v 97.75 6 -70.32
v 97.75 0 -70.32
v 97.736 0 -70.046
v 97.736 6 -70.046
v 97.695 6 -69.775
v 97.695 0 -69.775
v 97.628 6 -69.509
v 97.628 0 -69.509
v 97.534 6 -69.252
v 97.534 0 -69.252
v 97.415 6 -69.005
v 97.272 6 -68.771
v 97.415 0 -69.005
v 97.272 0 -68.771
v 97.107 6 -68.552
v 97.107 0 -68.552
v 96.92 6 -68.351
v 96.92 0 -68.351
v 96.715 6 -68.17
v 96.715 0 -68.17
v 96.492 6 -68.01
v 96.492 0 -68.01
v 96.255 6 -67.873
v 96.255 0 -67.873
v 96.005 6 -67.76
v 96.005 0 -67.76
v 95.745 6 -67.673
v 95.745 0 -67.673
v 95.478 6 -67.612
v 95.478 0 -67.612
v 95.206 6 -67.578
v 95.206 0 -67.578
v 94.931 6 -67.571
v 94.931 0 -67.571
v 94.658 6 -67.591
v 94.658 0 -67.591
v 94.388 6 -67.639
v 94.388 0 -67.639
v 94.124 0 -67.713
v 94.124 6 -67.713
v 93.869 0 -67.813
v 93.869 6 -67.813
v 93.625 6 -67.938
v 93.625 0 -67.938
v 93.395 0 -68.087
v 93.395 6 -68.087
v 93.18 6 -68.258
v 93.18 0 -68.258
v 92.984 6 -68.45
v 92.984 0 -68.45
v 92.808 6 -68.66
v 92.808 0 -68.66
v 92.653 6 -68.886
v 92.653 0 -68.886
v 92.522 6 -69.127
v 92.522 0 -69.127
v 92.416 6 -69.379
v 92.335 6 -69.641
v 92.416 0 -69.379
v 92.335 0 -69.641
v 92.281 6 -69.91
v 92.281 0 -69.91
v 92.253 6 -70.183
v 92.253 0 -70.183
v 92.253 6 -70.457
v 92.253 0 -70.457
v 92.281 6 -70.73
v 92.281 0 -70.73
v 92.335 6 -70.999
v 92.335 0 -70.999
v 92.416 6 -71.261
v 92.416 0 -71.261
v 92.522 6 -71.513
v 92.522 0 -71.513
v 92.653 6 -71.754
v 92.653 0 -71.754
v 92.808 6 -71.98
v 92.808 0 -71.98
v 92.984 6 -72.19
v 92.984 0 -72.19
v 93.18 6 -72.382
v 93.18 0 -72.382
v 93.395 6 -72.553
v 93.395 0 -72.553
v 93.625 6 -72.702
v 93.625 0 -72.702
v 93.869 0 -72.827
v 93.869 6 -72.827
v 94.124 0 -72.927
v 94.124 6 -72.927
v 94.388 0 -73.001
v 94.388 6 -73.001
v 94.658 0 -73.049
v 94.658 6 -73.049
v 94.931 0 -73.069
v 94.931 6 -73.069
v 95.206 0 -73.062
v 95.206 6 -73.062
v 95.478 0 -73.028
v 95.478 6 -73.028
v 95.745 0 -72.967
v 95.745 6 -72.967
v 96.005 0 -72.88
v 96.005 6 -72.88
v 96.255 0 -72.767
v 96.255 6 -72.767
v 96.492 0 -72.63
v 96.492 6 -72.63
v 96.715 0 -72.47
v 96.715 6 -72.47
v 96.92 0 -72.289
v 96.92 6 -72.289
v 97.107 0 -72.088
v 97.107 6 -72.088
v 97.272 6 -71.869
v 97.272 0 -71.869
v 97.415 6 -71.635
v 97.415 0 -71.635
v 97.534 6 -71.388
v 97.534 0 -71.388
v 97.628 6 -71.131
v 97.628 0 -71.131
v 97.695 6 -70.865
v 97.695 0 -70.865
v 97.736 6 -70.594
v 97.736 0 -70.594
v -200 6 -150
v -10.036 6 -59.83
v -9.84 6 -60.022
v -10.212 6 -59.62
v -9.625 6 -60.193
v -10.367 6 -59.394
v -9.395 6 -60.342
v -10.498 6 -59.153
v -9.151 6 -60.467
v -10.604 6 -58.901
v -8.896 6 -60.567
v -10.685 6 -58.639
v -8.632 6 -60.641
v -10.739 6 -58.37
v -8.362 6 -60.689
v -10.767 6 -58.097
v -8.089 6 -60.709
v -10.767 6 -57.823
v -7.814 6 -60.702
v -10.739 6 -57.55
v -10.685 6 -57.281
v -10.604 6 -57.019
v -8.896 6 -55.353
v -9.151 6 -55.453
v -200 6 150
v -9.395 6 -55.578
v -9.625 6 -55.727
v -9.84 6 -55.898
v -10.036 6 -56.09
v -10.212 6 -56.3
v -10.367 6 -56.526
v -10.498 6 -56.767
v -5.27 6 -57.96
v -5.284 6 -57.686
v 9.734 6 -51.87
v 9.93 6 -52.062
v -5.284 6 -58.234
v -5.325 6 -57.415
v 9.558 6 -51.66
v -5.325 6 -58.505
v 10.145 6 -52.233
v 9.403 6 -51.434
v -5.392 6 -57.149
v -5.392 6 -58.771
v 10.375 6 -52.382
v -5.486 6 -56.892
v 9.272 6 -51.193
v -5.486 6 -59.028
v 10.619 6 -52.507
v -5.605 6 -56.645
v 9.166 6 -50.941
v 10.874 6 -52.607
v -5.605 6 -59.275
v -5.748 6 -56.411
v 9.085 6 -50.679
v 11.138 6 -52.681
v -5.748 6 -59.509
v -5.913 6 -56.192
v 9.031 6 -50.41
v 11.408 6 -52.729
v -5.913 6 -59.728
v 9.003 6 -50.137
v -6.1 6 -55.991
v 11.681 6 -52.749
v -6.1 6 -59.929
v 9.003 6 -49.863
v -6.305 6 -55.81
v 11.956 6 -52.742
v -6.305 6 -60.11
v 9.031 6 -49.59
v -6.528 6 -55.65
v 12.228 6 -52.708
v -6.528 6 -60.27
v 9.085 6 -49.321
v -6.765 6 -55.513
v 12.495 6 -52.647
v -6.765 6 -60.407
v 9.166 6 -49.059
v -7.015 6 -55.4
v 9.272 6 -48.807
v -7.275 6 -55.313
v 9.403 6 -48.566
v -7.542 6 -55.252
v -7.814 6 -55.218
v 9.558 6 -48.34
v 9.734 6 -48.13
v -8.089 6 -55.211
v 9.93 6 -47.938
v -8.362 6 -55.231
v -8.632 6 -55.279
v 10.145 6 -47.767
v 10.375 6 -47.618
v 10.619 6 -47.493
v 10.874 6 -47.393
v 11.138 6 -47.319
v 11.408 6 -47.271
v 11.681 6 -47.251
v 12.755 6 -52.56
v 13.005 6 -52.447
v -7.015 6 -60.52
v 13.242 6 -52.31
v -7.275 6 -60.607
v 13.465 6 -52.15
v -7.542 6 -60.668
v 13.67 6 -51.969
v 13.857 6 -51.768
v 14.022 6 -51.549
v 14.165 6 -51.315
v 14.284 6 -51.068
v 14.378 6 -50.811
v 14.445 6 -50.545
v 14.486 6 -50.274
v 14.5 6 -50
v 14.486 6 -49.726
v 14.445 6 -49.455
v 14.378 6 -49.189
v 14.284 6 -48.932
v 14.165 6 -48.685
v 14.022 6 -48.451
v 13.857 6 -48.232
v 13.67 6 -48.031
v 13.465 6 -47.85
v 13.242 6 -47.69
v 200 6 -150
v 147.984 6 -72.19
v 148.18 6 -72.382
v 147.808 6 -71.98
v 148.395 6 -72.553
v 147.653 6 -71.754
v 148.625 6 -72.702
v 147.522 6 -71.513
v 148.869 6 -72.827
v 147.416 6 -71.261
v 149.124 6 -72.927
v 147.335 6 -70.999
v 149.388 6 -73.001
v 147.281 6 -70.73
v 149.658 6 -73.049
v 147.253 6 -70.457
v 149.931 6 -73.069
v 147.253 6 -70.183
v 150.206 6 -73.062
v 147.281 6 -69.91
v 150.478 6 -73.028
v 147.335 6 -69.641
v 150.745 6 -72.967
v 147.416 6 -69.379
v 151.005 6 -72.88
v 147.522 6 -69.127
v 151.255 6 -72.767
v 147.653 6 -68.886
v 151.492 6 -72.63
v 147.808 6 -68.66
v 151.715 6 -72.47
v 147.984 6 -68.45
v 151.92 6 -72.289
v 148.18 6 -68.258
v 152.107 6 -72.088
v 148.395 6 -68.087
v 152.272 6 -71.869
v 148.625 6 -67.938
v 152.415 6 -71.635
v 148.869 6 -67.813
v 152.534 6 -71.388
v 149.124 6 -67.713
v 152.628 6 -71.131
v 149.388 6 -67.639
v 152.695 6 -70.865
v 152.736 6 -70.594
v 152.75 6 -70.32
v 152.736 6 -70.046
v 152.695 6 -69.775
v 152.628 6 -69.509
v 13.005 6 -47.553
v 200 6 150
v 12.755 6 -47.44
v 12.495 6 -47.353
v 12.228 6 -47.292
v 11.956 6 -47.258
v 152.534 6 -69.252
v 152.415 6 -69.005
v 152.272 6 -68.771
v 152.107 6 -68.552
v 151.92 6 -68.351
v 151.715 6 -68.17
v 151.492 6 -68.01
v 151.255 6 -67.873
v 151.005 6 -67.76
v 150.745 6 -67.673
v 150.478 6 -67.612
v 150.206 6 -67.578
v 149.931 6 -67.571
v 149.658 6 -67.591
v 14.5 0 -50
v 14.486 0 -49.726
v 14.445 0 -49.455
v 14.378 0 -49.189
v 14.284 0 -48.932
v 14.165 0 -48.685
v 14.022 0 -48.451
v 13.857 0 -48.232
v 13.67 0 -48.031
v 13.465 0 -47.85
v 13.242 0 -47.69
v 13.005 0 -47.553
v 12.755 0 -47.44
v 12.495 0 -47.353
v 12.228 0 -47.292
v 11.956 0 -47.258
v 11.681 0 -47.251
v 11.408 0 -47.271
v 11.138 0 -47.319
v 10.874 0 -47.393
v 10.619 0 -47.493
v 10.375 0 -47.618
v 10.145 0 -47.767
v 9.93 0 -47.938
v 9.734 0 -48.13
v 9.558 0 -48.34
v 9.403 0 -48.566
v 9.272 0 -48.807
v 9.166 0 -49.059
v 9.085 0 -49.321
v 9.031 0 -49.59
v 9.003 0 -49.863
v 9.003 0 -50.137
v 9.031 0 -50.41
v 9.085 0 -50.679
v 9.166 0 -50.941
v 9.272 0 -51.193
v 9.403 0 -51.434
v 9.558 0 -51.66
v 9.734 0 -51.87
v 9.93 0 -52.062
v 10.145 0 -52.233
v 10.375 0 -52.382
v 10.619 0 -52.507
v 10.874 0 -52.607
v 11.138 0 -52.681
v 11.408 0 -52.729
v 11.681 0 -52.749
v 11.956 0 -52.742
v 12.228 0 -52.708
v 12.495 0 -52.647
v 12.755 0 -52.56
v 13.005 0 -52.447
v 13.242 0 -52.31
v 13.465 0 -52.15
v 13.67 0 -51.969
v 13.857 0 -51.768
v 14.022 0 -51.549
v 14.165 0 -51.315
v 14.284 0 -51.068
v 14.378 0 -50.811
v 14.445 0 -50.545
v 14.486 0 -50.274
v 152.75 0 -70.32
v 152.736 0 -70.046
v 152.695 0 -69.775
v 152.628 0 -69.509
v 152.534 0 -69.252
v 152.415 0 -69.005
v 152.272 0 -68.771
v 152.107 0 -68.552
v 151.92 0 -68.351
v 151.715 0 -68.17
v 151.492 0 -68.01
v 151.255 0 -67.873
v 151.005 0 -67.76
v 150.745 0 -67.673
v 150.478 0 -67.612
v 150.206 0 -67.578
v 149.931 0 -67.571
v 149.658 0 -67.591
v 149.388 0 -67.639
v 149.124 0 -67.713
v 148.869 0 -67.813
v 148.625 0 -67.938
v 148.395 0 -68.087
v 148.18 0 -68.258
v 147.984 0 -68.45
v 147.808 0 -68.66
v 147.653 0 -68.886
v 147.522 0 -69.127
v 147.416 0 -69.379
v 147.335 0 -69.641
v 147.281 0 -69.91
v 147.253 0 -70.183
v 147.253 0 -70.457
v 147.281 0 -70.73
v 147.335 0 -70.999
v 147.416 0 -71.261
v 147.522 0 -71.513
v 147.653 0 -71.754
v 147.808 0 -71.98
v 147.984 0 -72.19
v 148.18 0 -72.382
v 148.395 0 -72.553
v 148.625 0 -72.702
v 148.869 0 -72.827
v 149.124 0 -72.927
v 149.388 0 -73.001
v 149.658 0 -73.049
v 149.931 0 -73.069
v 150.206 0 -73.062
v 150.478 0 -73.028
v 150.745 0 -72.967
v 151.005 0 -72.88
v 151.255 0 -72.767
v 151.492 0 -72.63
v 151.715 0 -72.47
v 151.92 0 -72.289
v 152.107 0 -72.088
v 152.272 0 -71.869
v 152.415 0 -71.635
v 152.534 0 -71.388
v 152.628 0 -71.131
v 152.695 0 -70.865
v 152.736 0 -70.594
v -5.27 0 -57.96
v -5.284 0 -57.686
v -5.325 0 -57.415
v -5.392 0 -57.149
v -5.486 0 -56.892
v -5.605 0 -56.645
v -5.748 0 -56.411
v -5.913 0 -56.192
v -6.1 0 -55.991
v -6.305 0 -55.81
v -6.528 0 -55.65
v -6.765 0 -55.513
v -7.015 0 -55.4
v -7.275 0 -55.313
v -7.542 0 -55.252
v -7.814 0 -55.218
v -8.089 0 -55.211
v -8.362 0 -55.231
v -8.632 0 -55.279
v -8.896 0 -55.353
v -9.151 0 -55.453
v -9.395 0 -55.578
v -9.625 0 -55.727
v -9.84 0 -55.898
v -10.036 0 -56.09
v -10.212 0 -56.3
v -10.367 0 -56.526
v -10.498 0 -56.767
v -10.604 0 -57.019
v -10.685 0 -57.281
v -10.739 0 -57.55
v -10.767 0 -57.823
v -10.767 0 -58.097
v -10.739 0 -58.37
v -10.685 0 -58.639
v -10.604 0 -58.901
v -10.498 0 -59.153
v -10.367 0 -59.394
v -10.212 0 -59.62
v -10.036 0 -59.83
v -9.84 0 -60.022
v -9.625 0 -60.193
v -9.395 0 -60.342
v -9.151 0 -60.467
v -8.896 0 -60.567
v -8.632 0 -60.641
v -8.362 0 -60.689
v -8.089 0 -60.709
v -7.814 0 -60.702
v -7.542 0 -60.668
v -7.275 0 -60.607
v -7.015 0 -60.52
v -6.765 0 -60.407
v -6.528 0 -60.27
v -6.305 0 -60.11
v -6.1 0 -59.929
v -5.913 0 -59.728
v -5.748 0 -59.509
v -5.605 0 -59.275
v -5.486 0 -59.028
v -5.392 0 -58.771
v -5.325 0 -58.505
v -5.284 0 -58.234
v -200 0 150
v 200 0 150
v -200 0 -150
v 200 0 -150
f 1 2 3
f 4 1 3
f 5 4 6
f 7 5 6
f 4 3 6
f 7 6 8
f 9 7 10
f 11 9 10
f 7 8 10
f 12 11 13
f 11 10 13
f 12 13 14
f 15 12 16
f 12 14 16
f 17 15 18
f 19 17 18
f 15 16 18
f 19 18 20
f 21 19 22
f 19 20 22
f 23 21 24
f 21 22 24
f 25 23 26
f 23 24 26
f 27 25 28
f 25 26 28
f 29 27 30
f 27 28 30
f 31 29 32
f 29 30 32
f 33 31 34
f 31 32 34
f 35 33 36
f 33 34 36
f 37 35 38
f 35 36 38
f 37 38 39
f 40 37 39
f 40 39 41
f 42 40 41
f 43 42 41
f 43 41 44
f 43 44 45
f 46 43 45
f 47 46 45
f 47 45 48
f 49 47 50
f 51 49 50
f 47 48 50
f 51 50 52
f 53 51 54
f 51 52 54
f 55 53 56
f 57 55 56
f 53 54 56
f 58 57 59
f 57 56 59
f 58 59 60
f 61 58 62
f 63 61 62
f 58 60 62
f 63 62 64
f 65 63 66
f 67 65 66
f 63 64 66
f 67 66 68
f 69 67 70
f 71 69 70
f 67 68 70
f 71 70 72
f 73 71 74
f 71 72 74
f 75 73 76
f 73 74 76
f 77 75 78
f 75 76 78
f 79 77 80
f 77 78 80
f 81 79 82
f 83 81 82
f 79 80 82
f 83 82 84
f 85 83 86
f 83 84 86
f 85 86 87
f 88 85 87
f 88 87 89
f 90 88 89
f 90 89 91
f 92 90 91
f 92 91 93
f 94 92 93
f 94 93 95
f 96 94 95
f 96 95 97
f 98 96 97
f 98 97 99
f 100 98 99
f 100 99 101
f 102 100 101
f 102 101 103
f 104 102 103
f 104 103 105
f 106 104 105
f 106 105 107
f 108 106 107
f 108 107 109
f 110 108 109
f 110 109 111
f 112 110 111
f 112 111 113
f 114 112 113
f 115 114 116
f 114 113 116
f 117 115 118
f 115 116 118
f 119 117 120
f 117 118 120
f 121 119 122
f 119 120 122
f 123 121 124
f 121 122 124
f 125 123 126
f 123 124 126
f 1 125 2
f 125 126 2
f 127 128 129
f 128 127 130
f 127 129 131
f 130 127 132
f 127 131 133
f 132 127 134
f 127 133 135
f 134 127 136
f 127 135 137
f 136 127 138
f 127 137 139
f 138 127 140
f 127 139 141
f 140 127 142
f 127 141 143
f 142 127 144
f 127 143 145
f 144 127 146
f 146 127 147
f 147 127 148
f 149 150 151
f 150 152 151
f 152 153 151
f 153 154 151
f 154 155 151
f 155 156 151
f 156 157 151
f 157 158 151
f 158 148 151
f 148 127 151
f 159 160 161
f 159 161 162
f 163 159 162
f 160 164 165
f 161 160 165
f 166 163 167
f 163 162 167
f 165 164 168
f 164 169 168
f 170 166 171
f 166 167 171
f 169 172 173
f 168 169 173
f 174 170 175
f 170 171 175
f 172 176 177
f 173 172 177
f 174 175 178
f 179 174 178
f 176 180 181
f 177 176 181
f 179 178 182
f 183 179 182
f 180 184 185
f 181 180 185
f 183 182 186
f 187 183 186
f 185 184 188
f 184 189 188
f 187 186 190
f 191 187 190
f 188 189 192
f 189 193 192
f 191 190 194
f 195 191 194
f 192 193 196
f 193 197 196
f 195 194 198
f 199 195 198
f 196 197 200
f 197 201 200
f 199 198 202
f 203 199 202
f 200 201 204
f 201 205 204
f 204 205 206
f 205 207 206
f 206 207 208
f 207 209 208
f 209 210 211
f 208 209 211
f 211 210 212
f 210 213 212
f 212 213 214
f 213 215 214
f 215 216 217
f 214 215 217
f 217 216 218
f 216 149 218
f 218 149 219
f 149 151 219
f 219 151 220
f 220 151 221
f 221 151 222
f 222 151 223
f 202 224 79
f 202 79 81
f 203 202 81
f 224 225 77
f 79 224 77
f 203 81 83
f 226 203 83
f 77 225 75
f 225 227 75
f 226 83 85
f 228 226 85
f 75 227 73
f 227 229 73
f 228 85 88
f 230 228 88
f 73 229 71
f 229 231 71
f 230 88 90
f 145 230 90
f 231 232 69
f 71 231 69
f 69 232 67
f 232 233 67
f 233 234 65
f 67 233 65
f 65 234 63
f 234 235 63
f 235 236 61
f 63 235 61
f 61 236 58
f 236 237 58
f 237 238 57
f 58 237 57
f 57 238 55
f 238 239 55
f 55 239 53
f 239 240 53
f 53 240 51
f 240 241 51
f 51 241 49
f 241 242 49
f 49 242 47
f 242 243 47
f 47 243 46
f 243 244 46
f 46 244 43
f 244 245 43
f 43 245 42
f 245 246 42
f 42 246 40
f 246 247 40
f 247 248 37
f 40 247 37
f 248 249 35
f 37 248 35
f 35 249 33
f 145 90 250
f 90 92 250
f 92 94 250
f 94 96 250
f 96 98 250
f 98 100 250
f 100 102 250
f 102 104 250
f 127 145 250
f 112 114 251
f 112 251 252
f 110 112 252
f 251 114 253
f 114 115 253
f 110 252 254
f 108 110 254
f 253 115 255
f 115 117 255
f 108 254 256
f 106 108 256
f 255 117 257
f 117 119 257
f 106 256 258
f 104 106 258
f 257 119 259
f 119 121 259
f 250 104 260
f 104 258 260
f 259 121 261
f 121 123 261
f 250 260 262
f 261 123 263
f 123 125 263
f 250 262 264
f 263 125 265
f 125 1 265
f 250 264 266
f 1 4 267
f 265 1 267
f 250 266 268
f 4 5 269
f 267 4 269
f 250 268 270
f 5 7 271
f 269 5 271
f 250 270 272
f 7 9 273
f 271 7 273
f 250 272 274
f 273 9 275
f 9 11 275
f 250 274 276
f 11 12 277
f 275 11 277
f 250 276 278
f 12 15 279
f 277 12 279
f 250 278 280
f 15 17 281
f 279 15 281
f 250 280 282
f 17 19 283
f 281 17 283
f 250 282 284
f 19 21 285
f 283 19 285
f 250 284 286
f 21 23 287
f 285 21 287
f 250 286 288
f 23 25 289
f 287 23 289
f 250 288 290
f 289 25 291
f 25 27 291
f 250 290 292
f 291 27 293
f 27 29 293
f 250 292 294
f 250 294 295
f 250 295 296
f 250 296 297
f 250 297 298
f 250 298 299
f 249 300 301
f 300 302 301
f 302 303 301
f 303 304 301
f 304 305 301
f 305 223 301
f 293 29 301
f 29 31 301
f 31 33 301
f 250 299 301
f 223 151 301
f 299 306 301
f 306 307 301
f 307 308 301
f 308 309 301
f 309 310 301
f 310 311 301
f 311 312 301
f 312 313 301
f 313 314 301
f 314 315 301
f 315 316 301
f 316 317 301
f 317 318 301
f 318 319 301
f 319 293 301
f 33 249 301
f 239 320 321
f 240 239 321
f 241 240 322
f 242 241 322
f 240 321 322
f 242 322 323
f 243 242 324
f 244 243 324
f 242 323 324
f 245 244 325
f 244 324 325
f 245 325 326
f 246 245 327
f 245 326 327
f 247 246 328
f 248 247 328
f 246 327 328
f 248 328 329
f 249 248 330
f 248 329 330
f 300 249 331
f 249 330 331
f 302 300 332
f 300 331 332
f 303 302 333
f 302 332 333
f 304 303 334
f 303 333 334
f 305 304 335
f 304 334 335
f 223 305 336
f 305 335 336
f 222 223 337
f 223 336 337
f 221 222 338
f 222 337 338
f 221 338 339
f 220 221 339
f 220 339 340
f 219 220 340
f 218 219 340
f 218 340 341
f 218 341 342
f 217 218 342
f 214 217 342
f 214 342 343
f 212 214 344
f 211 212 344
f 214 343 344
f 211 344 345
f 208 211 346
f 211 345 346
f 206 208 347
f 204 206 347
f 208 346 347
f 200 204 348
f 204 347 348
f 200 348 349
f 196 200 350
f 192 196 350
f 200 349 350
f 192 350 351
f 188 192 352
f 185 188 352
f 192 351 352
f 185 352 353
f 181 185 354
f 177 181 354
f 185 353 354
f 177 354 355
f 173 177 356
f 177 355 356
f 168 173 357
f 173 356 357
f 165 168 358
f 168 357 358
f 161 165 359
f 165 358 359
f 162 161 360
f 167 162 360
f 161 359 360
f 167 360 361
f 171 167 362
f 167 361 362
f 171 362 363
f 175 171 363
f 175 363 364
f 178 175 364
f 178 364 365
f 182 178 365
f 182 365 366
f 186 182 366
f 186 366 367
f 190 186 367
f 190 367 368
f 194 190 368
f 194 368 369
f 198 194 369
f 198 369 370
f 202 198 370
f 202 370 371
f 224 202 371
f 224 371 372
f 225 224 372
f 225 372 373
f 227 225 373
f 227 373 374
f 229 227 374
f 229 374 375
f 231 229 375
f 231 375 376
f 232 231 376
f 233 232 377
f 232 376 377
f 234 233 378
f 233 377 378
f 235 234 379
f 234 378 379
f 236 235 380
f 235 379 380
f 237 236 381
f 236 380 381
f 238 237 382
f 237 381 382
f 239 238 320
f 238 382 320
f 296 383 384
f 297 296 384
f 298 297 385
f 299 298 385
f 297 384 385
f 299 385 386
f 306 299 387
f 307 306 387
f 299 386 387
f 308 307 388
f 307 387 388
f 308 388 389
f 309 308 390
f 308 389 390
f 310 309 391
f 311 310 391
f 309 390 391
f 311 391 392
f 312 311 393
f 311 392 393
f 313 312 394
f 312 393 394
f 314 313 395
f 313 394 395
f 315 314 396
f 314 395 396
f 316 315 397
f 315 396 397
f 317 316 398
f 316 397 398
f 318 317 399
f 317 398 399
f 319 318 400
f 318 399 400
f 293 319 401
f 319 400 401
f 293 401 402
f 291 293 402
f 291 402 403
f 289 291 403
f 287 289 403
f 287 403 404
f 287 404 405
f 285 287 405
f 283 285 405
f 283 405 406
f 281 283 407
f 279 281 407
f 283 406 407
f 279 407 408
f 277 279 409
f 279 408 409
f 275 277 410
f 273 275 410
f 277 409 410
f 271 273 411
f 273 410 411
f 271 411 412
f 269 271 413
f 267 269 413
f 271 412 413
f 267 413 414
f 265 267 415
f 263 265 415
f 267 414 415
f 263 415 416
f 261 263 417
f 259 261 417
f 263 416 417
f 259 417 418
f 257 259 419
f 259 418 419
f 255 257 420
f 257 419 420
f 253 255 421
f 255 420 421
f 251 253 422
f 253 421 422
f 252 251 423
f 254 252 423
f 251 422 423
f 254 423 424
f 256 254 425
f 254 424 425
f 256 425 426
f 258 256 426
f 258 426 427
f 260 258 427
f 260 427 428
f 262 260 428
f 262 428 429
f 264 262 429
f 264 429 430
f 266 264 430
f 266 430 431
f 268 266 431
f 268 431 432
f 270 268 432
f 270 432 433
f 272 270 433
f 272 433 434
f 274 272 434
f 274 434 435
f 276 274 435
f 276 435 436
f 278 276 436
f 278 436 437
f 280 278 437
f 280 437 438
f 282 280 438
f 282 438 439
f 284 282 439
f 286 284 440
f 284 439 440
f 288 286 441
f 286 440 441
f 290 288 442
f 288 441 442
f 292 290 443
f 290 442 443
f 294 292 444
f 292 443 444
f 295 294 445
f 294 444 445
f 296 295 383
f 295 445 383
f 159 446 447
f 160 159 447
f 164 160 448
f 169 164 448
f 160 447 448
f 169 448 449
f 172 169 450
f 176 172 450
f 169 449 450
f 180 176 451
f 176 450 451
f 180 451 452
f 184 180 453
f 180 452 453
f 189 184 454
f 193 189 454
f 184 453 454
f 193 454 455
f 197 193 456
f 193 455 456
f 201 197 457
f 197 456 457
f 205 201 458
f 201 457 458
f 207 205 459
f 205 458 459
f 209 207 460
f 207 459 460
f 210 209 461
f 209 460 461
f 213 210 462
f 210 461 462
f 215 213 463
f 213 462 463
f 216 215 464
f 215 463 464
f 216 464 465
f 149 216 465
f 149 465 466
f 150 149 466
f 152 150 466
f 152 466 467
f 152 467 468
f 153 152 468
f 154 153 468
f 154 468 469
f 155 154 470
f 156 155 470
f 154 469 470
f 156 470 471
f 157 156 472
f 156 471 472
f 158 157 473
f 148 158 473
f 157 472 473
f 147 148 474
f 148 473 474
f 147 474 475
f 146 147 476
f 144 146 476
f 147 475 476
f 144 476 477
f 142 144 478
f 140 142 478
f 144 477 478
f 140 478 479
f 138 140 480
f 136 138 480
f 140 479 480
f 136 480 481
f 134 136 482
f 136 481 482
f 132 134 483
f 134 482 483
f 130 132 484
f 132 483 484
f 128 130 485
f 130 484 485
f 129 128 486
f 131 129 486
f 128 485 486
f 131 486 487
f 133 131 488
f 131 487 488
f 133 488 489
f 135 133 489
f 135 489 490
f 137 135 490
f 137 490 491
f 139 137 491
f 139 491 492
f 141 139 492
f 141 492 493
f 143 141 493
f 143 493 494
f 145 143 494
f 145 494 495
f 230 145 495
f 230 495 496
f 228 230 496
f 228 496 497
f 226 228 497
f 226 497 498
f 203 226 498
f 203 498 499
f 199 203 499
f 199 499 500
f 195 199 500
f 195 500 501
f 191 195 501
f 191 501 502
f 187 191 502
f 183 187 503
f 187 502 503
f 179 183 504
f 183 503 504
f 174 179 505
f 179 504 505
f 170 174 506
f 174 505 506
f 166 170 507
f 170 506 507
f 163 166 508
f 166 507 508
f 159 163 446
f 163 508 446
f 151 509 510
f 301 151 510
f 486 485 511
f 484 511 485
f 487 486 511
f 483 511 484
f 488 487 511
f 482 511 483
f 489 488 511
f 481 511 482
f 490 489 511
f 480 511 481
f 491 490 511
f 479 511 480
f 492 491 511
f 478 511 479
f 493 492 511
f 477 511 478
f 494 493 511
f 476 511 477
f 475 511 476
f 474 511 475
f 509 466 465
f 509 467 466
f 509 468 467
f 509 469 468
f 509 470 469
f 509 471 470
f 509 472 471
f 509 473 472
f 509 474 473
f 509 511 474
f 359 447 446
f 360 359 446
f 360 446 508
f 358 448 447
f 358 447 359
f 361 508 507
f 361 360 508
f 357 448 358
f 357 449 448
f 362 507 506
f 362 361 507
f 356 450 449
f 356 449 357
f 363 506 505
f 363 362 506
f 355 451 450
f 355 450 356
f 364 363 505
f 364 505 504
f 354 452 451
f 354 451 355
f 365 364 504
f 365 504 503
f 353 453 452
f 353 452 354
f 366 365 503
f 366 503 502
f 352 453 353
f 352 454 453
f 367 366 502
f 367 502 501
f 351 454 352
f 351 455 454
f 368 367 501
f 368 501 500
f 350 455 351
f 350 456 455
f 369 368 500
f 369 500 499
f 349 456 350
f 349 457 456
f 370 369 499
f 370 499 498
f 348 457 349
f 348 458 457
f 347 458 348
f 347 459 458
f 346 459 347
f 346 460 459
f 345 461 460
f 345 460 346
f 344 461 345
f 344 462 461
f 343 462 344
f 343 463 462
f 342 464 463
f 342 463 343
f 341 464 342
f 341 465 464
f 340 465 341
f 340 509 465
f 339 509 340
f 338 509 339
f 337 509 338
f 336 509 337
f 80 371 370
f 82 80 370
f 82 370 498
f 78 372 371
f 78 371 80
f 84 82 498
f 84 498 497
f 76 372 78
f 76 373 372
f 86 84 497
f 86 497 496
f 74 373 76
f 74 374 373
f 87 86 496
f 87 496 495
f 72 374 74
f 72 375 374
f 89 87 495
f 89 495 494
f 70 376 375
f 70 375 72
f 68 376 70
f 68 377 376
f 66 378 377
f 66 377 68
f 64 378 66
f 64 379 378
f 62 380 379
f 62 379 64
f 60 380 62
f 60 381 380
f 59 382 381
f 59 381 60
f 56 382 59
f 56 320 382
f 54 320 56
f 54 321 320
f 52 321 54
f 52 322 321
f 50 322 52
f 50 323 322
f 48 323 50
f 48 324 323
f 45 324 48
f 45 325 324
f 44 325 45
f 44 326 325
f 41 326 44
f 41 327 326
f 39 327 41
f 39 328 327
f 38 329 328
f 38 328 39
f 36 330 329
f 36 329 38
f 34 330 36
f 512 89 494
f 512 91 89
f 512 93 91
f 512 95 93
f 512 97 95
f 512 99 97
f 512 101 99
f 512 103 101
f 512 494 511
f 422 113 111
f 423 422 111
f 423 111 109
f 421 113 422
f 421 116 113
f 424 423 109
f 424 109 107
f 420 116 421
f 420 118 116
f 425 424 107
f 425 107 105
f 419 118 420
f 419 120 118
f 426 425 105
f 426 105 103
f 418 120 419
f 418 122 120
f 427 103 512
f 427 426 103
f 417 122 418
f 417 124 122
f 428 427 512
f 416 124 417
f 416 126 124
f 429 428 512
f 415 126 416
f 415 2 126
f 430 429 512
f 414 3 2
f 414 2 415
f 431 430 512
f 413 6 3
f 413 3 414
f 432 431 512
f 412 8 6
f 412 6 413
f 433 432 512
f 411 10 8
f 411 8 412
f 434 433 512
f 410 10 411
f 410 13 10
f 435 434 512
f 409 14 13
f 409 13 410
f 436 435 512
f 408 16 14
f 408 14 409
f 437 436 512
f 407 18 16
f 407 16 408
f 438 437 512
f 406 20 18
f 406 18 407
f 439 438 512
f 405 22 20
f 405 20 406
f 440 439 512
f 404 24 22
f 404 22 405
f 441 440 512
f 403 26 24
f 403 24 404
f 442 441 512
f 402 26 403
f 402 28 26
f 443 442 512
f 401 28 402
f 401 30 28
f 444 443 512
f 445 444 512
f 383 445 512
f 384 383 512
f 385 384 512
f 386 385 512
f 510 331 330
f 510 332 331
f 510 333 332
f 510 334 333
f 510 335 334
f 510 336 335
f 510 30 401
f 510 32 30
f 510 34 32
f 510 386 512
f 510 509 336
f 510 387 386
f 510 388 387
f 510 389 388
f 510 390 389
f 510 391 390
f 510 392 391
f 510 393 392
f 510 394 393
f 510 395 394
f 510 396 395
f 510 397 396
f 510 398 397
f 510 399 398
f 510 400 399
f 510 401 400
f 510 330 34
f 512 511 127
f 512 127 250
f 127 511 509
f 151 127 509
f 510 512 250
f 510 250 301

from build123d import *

# Parameters (mm, degrees)
F0_W     = 400
F0_H     = 300
F1_DEPTH = 6
F3_R     = 2.75
F4_DEPTH = 6


with BuildPart() as f1:
    # F0 (on Front) → F1 (new body)
    with BuildSketch(Plane.XZ):
        Rectangle(F0_W, F0_H)
    extrude(amount=-F1_DEPTH)

    # F3 (on face) → F4 (cut, through all)
    with BuildSketch(Plane.XZ):
        with Locations((150, -70.32)):
            Circle(F3_R)
        with Locations((95, -70.32)):
            Circle(F3_R)
        with Locations((11.75, -50)):
            Circle(F3_R)
        with Locations((-8.02, -57.96)):
            Circle(F3_R)
    extrude(amount=-F4_DEPTH, mode=Mode.SUBTRACT)


solid = f1.part
